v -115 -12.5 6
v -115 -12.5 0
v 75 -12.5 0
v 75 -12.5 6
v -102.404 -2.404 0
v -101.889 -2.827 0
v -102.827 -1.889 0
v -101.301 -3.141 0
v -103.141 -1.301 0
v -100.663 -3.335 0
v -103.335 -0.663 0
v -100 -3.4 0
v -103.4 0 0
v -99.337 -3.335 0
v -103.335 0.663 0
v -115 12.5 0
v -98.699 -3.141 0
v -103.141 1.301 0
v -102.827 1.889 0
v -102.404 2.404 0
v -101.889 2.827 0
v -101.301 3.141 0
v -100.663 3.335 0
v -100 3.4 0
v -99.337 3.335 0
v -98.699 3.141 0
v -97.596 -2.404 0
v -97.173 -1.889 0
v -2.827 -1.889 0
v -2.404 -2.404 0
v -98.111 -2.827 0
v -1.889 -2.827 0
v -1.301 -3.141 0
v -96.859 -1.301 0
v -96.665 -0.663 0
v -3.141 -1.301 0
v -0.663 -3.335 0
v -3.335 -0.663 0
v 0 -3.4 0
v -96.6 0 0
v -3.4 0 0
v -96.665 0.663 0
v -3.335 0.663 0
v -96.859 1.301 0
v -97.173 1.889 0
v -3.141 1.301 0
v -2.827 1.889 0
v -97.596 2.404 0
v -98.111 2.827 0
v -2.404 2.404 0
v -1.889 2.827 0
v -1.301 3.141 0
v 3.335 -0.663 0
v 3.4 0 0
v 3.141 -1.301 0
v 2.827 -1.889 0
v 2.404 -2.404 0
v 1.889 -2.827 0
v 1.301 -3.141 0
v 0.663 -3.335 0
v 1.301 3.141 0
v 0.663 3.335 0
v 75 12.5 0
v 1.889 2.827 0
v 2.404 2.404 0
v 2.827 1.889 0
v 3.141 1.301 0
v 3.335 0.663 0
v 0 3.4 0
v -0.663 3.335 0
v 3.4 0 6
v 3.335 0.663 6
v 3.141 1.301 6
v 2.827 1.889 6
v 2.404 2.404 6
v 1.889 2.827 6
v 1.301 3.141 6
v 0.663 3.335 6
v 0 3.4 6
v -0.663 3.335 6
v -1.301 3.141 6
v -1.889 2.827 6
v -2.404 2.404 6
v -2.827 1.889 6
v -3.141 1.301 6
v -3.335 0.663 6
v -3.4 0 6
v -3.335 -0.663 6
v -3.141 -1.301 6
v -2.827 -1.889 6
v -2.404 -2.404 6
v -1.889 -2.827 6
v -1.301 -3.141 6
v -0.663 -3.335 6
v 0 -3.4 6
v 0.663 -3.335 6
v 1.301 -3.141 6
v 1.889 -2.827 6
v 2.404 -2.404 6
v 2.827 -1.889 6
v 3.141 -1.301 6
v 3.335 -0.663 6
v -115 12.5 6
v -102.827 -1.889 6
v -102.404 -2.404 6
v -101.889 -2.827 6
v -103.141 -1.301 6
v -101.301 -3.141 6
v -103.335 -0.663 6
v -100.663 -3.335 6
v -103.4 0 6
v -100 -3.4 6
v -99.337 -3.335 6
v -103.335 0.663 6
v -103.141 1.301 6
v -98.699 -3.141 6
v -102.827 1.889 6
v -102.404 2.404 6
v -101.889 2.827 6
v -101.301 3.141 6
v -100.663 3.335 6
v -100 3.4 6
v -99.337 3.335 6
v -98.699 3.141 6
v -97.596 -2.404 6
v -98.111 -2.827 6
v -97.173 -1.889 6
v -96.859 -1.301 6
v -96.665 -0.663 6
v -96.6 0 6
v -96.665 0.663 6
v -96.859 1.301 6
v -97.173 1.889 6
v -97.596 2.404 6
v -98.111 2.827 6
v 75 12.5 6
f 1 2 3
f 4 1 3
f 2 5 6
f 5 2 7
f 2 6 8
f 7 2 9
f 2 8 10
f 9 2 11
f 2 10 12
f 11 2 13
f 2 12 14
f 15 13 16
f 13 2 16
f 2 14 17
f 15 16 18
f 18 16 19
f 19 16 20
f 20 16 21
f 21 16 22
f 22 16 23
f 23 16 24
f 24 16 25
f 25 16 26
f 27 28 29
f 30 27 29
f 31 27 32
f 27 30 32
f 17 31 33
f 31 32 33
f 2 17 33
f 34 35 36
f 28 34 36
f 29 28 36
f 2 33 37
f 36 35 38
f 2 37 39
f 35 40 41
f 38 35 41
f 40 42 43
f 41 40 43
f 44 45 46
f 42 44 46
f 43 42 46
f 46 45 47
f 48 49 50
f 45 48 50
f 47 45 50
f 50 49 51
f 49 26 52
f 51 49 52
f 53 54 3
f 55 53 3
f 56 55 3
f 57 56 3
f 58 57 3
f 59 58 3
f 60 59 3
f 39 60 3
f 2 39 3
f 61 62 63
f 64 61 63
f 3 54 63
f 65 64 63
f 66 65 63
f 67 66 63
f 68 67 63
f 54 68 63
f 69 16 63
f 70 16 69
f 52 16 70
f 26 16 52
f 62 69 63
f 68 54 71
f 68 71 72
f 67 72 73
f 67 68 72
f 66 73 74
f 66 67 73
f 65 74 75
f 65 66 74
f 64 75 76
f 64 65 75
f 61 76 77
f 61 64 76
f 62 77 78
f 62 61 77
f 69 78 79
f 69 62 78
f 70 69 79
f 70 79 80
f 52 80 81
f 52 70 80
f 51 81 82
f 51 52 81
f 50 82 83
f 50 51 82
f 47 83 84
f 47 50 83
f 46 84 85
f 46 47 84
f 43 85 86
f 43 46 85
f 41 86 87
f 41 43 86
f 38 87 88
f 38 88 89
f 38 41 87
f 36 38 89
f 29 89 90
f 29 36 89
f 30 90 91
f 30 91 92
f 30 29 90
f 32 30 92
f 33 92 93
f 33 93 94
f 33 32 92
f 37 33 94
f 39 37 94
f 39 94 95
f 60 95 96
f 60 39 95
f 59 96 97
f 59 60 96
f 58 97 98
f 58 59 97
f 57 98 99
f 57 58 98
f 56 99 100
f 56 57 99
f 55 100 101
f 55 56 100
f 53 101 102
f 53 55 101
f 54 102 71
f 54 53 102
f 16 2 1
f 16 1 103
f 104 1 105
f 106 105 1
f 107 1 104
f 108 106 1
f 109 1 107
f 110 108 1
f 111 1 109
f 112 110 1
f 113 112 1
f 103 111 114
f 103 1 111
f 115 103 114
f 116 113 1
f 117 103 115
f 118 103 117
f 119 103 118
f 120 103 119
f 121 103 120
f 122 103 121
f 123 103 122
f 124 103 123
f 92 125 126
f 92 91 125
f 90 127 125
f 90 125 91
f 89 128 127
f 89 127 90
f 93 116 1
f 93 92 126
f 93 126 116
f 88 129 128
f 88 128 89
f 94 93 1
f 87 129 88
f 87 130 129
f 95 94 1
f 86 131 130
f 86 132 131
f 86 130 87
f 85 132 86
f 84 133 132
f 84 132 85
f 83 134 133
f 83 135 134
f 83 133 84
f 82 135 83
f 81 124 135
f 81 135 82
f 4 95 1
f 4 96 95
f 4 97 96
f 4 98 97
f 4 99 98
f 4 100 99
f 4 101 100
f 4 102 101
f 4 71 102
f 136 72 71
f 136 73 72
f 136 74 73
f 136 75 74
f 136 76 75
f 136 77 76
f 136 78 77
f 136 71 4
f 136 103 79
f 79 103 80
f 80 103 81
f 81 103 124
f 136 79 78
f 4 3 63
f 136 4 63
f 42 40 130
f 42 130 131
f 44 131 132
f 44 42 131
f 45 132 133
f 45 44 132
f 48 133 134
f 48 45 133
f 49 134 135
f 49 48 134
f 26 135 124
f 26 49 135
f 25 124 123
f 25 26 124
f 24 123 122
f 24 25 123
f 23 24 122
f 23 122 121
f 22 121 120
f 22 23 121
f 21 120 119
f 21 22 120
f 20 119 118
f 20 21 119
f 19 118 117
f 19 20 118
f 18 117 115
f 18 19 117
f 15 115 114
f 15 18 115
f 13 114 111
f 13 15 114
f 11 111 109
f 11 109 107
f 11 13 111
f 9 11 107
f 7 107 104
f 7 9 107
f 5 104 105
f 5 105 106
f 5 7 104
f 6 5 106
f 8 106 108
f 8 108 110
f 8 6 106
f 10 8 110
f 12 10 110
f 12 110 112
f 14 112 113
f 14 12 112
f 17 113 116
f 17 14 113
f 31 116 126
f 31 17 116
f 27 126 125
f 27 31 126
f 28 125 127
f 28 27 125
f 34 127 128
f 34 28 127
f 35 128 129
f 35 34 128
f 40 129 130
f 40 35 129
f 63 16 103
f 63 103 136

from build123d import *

# Parameters (mm, degrees)
SKETCH1_W             = 190
SKETCH1_H             = 25
SKETCH1_R             = 3.4
BASE_EXTRUDE_DEPTH    = 6
M8_TAPPED_HOLE1_D     = 6.8
M8_TAPPED_HOLE1_DEPTH = 22.25
M8_TAPPED_HOLE1_TIP   = 2.042926105


with BuildPart() as part:
    # Sketch1 → Base-Extrude (new body)
    with BuildSketch(Plane.XY):
        with Locations((-20, 0)):
            Rectangle(SKETCH1_W, SKETCH1_H)
        Circle(SKETCH1_R, mode=Mode.SUBTRACT)
        with Locations((-100, 0)):
            Circle(SKETCH1_R, mode=Mode.SUBTRACT)
    extrude(amount=BASE_EXTRUDE_DEPTH)

    # M8 Tapped Hole1
    with Locations(Plane(origin=(-100, 0, 6), x_dir=(1, 0, 0), z_dir=(0, 0, 1))):
        with Locations((0, 0), (100, 0)):
            Hole(M8_TAPPED_HOLE1_D / 2, depth=M8_TAPPED_HOLE1_DEPTH)
            with Locations((0, 0, -(M8_TAPPED_HOLE1_DEPTH + M8_TAPPED_HOLE1_TIP / 2))):  # 118° drill point
                Cone(0, M8_TAPPED_HOLE1_D / 2, M8_TAPPED_HOLE1_TIP, mode=Mode.SUBTRACT)


solid = part.part
